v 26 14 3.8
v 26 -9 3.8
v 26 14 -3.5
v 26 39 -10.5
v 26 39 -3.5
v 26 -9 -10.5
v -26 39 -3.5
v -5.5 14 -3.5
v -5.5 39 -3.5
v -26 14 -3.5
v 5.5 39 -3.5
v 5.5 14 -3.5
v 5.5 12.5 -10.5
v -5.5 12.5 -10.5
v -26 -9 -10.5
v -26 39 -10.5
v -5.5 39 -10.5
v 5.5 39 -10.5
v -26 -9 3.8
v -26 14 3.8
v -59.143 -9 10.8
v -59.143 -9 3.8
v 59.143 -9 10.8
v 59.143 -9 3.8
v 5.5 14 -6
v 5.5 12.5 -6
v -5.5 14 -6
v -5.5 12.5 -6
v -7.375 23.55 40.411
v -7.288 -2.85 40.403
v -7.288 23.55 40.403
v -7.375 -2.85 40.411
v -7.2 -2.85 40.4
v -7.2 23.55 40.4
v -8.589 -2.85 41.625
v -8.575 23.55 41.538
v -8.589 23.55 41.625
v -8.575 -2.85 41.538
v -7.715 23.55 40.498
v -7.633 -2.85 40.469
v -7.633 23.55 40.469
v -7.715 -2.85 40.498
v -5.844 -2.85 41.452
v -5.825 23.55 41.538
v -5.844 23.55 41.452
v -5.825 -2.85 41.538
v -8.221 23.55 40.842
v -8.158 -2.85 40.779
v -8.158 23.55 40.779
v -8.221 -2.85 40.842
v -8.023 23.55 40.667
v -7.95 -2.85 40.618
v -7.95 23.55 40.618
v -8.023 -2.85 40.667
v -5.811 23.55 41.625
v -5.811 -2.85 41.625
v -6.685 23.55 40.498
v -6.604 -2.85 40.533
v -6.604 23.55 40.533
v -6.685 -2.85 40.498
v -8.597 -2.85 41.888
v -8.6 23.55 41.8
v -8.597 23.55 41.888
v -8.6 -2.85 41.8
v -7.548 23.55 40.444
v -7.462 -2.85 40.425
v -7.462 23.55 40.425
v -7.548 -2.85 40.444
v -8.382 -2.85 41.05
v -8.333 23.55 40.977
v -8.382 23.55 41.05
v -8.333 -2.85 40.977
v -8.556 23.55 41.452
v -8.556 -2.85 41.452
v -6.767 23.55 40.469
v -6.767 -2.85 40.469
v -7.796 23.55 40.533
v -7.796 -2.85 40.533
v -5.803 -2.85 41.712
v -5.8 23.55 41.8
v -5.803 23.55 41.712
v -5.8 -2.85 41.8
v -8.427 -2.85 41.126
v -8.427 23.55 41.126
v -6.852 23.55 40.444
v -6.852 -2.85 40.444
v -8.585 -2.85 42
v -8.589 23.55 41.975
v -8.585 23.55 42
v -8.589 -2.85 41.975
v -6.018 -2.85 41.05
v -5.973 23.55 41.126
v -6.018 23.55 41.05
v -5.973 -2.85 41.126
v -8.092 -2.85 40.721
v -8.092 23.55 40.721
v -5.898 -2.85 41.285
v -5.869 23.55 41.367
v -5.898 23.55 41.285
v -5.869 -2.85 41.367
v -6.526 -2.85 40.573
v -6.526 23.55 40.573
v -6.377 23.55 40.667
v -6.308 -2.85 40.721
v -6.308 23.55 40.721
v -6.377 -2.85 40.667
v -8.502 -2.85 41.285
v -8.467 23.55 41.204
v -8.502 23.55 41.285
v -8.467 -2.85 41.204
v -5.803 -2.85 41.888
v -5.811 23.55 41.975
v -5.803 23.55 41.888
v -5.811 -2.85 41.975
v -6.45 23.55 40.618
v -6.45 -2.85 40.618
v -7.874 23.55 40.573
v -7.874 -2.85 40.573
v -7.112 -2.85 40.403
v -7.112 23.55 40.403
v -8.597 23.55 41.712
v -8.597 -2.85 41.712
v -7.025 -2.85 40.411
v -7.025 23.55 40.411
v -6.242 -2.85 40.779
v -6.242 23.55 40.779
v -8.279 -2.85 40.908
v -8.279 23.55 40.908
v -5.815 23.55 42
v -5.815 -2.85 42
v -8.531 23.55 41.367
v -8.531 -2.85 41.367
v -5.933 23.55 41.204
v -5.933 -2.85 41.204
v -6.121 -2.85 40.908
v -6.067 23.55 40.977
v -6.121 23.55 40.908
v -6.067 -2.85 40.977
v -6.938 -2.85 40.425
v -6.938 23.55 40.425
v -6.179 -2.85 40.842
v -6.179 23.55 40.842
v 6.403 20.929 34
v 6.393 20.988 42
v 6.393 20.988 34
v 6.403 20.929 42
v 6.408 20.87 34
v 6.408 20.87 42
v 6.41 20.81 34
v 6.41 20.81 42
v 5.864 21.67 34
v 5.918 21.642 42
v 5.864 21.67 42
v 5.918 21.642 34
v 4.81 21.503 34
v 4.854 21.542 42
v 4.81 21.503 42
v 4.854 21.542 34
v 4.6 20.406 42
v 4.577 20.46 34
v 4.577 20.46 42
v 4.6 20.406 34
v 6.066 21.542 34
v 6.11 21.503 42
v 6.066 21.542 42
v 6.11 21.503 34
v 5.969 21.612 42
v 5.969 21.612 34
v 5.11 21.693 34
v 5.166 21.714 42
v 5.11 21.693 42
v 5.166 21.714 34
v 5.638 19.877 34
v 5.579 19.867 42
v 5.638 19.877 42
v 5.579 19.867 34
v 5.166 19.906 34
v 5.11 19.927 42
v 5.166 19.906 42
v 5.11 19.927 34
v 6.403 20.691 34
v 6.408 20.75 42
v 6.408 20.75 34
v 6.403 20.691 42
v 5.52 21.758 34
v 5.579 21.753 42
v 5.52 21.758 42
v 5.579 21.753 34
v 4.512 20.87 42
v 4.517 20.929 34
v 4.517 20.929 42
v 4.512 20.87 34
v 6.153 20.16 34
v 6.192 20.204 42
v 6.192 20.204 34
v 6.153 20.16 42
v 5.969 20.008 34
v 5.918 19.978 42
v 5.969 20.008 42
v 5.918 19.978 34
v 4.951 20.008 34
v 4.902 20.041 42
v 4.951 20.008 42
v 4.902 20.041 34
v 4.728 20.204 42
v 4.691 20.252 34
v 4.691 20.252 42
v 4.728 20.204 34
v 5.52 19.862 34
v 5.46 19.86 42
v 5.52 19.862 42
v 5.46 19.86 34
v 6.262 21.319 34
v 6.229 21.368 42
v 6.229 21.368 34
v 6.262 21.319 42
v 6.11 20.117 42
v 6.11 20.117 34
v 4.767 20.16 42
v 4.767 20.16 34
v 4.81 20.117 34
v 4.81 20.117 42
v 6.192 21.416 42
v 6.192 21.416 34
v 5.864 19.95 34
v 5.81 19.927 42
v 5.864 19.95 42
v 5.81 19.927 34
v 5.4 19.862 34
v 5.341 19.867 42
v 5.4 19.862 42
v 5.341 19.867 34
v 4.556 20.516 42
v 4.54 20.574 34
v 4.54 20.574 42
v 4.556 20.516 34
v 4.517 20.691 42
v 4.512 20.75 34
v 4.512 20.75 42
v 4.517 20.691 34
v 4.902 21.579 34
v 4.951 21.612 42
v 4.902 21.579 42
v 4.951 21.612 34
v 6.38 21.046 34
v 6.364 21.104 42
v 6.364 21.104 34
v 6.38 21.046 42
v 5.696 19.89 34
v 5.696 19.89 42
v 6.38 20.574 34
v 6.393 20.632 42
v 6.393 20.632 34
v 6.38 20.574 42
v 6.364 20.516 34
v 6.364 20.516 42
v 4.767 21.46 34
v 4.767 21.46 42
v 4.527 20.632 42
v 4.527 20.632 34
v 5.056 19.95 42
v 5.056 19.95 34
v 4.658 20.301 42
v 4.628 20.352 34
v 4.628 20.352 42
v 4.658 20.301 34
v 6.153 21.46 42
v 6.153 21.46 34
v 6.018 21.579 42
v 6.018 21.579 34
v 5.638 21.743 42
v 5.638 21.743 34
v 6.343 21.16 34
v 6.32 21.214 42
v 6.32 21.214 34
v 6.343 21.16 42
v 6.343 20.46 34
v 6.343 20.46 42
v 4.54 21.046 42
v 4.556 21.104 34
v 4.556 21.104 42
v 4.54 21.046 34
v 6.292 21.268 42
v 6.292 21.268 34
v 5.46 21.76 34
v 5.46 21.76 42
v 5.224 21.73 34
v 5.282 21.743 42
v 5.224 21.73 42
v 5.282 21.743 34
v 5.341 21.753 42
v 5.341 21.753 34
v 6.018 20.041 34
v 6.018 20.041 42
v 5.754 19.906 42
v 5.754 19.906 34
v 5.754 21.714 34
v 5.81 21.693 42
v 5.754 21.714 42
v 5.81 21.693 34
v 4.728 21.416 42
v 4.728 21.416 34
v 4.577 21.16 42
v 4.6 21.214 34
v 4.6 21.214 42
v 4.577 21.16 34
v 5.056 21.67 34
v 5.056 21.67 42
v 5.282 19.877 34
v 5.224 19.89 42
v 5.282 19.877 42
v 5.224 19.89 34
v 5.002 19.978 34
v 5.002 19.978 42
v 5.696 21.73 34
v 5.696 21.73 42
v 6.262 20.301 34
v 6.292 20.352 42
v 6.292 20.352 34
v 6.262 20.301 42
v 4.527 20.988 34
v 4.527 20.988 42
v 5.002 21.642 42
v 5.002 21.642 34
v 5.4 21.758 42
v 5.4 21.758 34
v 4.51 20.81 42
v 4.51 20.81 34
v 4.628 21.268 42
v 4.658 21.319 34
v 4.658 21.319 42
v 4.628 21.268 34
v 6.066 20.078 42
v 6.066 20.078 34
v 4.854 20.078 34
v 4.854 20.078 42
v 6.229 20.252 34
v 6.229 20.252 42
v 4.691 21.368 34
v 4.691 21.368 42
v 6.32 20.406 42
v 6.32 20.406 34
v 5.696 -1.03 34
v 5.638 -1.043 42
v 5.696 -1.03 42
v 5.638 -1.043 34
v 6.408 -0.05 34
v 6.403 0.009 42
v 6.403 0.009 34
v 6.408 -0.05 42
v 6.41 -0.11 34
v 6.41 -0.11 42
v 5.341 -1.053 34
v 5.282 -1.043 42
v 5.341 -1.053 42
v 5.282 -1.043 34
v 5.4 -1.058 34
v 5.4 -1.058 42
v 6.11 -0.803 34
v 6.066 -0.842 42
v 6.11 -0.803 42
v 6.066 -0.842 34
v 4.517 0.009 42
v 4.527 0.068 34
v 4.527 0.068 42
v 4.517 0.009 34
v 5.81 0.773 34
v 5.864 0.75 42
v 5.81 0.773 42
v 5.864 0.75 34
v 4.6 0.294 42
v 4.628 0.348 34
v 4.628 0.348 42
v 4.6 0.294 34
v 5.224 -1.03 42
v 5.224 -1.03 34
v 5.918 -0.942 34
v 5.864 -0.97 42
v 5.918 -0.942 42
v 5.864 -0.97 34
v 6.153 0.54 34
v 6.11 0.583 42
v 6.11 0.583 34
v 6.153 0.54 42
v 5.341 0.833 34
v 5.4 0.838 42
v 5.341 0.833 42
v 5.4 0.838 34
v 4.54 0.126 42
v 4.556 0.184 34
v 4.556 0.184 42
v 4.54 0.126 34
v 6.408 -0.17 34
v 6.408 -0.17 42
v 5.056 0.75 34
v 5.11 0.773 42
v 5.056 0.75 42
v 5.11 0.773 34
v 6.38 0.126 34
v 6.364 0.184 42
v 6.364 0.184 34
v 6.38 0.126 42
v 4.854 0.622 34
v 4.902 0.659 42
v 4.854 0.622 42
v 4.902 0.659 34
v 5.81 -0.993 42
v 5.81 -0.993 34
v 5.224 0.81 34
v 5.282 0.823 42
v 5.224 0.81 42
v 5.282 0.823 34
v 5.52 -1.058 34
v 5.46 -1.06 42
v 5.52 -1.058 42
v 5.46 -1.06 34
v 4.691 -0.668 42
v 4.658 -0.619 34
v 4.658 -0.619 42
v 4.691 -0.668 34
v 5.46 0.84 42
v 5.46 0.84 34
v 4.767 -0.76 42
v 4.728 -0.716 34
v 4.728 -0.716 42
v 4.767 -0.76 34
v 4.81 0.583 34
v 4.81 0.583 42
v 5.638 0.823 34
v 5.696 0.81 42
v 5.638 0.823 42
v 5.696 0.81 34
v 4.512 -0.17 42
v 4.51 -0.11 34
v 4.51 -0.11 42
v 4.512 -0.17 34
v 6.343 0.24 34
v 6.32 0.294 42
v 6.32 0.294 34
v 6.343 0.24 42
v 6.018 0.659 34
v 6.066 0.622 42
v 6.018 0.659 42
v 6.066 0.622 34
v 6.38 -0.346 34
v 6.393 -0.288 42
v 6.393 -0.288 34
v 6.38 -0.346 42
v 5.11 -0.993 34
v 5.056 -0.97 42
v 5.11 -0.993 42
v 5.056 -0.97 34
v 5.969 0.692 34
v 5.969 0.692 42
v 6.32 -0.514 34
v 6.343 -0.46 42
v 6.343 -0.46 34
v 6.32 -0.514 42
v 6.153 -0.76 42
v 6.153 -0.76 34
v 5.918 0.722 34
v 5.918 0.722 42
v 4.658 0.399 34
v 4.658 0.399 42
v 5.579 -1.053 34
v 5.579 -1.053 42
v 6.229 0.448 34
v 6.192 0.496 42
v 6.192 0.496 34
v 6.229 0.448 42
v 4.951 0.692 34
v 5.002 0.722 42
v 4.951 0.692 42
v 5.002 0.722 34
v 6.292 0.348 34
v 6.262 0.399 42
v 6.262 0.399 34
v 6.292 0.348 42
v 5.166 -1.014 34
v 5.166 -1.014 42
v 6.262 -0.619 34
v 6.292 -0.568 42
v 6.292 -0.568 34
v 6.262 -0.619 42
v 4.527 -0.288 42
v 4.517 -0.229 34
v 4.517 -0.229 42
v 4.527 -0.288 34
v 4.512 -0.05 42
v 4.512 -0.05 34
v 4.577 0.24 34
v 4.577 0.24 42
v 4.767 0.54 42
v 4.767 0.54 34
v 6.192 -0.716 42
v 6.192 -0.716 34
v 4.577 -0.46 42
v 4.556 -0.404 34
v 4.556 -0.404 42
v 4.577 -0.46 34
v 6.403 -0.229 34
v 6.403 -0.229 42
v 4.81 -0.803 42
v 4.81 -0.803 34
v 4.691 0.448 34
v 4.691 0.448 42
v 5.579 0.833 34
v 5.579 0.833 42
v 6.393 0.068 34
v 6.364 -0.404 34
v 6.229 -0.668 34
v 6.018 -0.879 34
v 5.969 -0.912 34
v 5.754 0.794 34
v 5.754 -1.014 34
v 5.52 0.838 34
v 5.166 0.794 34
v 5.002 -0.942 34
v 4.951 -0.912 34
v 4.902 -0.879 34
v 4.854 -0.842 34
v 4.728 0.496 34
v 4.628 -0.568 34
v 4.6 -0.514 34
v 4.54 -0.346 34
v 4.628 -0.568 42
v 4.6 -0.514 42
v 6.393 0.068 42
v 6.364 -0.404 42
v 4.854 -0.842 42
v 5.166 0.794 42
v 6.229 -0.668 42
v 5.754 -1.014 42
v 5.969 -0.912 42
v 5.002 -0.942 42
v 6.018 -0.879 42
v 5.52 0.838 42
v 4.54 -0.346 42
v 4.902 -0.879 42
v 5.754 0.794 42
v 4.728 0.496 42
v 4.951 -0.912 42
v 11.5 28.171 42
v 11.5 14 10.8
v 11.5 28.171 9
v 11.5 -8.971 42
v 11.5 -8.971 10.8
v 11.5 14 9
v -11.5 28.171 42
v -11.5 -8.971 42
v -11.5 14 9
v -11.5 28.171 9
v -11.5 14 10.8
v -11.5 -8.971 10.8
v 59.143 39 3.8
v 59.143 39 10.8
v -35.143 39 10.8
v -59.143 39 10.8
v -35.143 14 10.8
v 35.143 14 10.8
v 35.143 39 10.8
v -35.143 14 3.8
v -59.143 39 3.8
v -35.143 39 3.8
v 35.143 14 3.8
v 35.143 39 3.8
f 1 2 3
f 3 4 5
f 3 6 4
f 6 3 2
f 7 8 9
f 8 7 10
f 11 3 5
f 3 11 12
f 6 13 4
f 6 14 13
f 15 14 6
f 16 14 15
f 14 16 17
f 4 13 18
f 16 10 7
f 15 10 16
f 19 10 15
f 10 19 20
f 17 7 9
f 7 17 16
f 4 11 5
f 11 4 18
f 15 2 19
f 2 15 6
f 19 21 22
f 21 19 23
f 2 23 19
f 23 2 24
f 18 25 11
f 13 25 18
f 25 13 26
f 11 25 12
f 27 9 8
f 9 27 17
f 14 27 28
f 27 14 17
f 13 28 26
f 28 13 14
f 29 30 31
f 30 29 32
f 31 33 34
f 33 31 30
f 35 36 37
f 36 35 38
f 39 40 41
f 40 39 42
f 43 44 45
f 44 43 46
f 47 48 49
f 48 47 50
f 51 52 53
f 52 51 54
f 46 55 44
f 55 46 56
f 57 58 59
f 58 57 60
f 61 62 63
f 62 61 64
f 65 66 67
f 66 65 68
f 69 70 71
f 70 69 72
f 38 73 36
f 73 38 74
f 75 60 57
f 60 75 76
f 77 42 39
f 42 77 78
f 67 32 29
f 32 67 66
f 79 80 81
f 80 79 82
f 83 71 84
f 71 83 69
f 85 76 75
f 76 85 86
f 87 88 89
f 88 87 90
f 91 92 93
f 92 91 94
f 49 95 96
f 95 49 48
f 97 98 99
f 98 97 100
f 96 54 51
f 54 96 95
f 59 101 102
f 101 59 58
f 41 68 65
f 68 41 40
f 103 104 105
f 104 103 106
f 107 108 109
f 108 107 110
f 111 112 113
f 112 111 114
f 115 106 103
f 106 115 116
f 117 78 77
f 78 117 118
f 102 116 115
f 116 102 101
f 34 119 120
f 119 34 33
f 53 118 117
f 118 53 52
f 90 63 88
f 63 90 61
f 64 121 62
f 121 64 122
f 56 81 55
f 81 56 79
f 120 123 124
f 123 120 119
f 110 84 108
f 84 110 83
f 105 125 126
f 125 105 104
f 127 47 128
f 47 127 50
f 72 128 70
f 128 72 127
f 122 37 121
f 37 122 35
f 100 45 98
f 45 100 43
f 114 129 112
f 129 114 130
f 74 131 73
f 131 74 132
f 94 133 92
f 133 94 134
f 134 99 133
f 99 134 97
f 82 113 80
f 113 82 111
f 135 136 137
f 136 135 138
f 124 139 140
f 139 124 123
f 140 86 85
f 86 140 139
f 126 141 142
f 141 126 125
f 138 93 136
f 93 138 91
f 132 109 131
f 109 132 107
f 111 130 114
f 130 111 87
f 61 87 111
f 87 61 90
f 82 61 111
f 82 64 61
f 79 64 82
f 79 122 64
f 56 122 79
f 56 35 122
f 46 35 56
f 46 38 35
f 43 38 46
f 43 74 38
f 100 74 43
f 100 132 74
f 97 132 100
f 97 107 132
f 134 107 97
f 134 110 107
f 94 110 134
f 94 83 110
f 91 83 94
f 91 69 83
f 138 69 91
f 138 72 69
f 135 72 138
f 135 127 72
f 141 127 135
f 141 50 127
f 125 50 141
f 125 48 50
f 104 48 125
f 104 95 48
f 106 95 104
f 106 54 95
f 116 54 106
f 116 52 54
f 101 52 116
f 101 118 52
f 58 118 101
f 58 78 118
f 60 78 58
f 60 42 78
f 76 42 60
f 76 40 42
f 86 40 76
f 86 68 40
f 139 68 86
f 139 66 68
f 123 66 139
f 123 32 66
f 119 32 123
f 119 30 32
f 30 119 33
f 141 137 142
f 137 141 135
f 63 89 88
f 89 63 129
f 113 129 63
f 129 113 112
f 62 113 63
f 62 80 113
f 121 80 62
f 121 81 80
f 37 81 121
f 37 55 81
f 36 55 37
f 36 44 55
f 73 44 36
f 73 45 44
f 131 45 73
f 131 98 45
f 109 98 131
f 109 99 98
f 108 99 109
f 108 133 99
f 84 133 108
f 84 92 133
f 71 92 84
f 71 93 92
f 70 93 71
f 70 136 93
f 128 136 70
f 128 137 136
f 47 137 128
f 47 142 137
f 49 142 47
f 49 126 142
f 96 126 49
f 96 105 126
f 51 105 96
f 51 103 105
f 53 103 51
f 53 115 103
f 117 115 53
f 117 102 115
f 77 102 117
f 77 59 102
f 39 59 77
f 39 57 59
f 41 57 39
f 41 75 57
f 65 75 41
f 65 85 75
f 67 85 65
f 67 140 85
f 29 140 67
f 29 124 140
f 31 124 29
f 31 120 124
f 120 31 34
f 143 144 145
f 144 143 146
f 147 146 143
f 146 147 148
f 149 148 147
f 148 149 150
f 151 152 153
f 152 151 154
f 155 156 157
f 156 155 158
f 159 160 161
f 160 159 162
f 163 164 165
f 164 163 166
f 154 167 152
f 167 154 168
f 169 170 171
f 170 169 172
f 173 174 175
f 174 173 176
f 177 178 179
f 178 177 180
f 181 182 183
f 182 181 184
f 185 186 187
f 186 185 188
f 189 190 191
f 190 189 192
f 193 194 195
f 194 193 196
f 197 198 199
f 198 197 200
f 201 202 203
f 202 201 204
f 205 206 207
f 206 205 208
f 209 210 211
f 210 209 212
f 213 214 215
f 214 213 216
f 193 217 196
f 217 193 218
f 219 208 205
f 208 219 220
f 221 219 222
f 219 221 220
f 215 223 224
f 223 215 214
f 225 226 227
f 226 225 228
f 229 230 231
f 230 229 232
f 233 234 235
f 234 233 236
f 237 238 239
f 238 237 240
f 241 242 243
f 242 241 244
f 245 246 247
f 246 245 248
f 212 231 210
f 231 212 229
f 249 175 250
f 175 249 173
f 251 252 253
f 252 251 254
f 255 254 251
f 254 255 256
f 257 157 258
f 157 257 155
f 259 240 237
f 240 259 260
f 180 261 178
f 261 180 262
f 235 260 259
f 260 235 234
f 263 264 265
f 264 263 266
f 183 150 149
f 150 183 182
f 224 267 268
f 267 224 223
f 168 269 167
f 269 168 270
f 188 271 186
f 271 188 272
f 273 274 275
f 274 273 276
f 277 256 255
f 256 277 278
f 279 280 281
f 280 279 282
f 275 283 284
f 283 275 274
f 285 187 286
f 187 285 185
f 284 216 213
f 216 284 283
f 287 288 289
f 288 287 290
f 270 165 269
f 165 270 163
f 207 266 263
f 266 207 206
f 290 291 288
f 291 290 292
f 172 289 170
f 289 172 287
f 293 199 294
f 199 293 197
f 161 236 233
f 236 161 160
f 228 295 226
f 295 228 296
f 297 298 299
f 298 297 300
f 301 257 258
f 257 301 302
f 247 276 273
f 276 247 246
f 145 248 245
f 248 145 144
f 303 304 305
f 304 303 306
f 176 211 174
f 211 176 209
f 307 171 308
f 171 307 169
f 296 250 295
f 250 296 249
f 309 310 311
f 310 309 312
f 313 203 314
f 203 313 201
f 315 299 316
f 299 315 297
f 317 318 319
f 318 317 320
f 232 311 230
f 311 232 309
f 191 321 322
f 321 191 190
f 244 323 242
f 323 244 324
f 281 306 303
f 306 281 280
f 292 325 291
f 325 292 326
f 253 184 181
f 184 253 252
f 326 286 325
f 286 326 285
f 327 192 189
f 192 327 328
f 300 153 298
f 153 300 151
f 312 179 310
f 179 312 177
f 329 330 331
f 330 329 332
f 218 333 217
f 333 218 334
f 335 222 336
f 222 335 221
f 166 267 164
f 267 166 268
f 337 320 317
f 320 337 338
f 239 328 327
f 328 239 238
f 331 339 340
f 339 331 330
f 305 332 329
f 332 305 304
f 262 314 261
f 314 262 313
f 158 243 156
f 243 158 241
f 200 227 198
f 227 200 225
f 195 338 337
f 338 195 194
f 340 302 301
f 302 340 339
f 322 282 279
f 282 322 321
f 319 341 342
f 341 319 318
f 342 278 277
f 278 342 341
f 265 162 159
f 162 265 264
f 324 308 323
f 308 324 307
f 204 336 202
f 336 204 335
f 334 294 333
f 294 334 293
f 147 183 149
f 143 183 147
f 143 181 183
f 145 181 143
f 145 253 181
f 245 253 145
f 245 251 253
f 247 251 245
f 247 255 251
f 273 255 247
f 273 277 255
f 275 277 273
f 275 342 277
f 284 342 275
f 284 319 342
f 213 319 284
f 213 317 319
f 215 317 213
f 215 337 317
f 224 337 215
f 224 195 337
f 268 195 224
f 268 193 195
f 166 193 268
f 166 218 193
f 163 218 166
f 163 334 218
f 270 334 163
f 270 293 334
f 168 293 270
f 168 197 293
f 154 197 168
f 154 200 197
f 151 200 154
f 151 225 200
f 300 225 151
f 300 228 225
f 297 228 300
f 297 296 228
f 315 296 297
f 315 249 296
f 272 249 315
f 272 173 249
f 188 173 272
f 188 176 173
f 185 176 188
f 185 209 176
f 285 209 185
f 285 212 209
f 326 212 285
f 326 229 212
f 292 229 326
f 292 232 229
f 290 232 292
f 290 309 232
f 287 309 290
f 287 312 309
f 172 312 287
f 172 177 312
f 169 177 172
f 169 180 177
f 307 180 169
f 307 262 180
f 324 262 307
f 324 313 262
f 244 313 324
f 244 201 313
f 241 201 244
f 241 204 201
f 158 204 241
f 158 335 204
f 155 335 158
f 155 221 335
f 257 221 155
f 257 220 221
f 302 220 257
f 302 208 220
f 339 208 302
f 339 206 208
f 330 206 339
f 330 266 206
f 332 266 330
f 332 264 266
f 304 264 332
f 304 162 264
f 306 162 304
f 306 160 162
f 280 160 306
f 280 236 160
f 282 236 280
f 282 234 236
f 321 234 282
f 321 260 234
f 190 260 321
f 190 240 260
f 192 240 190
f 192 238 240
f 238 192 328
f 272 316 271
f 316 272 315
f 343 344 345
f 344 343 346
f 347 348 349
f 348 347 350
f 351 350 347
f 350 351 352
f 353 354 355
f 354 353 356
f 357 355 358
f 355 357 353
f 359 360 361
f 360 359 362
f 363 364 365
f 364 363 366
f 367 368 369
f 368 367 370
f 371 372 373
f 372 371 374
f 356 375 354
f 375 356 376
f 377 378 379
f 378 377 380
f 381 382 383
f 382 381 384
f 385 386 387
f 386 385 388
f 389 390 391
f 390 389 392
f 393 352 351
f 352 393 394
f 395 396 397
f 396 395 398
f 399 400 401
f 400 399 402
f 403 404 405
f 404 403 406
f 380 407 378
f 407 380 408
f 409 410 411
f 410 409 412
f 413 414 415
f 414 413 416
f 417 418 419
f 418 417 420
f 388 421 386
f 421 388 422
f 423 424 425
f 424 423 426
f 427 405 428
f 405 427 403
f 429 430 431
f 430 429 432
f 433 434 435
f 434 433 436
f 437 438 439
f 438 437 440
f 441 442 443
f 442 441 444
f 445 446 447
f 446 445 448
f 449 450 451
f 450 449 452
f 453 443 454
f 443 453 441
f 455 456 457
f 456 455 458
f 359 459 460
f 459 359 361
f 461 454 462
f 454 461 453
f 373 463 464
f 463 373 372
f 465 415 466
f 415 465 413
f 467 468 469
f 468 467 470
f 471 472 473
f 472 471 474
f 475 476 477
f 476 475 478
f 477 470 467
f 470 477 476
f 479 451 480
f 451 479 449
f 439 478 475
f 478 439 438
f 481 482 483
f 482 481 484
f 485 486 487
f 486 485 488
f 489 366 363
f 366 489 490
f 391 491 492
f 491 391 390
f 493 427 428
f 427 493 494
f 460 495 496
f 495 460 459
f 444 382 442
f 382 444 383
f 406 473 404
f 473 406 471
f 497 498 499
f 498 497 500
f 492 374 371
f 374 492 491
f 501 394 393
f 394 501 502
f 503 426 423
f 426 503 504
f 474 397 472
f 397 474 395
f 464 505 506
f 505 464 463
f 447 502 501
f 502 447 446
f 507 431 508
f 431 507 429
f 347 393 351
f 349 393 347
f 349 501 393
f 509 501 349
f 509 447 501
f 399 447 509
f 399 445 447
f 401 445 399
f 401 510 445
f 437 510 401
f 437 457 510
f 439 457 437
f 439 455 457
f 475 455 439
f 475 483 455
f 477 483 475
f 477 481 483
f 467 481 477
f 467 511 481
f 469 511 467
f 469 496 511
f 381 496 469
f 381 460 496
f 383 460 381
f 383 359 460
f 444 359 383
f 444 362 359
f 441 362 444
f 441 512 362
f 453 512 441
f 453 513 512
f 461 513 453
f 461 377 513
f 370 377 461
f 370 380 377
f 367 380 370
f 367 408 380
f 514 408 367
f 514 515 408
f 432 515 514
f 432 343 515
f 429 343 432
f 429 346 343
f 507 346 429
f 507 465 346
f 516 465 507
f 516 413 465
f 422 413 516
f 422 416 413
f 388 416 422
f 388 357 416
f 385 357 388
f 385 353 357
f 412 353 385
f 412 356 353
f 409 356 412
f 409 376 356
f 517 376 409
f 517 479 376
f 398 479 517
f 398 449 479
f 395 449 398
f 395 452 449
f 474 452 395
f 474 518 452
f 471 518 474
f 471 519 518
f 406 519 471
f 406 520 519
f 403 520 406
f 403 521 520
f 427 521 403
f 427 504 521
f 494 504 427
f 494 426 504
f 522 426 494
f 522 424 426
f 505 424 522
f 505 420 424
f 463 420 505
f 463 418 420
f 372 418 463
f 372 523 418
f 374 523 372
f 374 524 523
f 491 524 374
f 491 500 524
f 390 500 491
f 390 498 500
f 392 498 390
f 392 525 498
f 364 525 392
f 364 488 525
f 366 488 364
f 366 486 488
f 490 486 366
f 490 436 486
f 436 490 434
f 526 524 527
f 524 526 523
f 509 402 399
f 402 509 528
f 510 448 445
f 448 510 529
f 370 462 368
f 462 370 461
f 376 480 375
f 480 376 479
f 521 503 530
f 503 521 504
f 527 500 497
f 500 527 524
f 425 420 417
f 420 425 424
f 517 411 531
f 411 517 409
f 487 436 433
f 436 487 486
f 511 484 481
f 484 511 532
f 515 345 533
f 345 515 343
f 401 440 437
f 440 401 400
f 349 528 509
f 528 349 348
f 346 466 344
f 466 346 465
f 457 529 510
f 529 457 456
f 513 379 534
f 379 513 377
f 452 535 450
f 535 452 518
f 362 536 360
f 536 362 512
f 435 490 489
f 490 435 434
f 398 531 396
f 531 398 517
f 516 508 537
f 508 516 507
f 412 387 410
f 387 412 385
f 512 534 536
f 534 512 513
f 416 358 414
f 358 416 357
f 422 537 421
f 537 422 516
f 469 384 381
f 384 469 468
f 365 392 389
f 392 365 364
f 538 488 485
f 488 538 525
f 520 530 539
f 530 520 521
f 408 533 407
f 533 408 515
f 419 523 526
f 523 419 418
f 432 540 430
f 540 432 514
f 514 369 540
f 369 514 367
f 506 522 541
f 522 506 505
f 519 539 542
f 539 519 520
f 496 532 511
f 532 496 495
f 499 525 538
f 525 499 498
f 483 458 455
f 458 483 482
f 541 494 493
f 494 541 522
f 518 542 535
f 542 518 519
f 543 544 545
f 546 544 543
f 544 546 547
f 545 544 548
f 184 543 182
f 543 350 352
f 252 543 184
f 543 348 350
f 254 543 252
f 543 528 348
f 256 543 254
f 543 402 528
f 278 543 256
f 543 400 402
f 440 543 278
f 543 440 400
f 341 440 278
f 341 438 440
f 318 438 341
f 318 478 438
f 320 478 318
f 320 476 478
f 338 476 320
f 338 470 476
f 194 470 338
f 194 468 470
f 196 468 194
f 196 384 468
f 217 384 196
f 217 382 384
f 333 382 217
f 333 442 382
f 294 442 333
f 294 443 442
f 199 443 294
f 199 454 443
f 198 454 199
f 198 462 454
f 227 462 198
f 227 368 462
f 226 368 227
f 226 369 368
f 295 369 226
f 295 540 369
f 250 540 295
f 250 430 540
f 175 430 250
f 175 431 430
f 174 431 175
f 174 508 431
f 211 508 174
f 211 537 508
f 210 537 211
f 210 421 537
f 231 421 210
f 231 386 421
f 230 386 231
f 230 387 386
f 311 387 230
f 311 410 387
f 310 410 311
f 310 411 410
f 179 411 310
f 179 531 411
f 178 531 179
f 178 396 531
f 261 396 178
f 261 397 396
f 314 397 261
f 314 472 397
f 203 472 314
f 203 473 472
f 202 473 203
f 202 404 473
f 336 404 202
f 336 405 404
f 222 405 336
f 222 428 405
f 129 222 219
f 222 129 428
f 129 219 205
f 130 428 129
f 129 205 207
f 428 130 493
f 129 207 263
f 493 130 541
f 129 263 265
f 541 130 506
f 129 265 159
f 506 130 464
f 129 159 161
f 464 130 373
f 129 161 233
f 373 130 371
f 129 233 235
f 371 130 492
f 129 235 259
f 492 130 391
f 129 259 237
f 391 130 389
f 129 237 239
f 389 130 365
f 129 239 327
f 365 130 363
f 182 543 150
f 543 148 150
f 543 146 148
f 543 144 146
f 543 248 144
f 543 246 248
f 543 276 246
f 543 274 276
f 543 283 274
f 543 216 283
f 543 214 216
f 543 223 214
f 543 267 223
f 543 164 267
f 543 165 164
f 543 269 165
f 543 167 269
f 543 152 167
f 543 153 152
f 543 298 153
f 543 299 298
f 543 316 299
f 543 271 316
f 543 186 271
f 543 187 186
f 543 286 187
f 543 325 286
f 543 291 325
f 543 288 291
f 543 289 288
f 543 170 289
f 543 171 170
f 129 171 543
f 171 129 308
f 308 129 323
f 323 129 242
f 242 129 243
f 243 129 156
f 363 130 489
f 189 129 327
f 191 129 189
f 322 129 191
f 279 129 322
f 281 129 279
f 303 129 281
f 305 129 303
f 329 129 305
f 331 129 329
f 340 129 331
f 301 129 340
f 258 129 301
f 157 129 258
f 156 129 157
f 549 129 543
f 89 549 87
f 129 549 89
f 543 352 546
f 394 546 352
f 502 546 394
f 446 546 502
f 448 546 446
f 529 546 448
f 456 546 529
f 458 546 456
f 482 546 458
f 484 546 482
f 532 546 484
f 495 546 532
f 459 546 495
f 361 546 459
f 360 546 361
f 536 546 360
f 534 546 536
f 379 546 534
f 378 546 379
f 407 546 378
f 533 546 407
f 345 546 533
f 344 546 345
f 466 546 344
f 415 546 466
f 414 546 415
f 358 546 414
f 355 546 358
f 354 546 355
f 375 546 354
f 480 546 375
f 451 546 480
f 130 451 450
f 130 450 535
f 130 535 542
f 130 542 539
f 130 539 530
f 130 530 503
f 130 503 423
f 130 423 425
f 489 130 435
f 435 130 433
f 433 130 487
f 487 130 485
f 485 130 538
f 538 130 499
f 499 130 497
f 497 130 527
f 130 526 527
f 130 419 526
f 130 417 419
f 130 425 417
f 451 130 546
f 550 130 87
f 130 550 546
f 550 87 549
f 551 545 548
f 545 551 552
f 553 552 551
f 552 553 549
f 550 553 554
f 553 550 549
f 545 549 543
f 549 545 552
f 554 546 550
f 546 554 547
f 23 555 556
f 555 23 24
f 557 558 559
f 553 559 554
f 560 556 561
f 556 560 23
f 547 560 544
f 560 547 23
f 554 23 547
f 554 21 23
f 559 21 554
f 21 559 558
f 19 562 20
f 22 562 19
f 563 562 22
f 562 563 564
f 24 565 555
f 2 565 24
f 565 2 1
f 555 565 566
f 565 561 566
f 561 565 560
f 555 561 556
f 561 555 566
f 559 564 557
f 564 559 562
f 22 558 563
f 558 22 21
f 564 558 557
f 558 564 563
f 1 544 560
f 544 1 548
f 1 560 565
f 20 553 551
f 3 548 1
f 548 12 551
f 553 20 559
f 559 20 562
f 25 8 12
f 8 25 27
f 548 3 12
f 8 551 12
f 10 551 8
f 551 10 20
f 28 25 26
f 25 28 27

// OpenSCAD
// file: ../robot_settings.scad
main_box_x = 100; // 96
main_box_y = 102;
main_box_z = 74; // 74.5

lfp_main_box_x = 65;
lfp_main_box_y = 152;
lfp_main_box_z = 94;

wall_thickness = 5;

rail_gap = 2;
rail_inset = 7;

rail_thickness = 7;
rail_length = 250;
rail_width = 260;

lfp_battery_width = 65.5;
lfp_battery_depth = 150.5;
lfp_battery_height = 93;
lfp_battery_midterrace_width = 64.8;
lfp_battery_midterrace_depth = 150.2;
lfp_battery_midterrace_height = 7.8;
lfp_battery_topterrace_width = 62.8;
lfp_battery_topterrace_depth = 149.4;
lfp_battery_topterrace_height = 6.6;

// red right
// black left
lfp_battery_terminal_width = 9.2;
lfp_battery_terminal_depth = 9.5;
lfp_battery_terminal_depth_setback = 4.4;
lfp_battery_terminal_width_setback = 5.9;

raspberry_pi_screw_seperation_y = 57;
raspberry_pi_screw_seperation_z = 48;
raspberry_pi_peg_h = 5;

battery_box_peg_h = 6;
battery_box_peg_d = 9.5;
battery_box_peg_cutout = 5;

gears_module = 1;
pinion_gear_teeth = 32;
pinion_gear_width = 5;
pinion_gear_bore = 8;

gears_setback_distance = 25;
gear_post_height = 2 * pinion_gear_width + rail_thickness + 8 ;

steering_motor_mount_x = 45;
steering_motor_mount_y = 36;
steering_motor_mount_z = 18;
steering_motor_mount_setback_distance = gears_setback_distance + 16;

cradle_wall_thickness = 5;
post_thickness_x_y = 10;
post_wallside_position_y = 12.5;
post_separation_y = 47.5;
post_x_position = 70; // width of cradle. this is proportional to rail_width.

imu_width = 26; // x is along the width axis
imu_depth = 16; // y is along the depth axes. +y points at pins.
imu_screw_d = 3;
imu_screw_corner_border = 1.27;
imu_underside_pin_h = 1; // z is along the h axis
imu_thickness = 1.6;
imu_left_edge_pins = 1.6;

dc_motor_drivertype = "Teyleten"; // Teyleten
isAdafruit = (dc_motor_drivertype == "Adafruit");

drv8871_x = isAdafruit ? 20.3 : 21.6;
drv8871_y = isAdafruit ?  24 : 25;

drv8871_z = 2;
drv8871_screw_d = 2.5;
drv8871_solder_points_z = 2;

drv8871mount_edge_x = 1.5;
drv8871mount_edge_wall = 3;
drv8871mount_z = 5;
drv8871mount_x = drv8871_x +  drv8871mount_edge_wall - 2* drv8871mount_edge_x;
drv8871mount_y = 19;

drv8871_screw_distance = 15.64;
drv8871_solder_points_d = 1.66;
drv8871_solder_offset_y = 4.4;
drv8871_solder_inner_points_distance = 5;
drv8871_solder_outer_points_distance = 12;

dc_motor_75_1_encoder_z = 14.75;
dc_motor_75_1_encoder_d = 24.5;
dc_motor_75_1_housing_z = 30;
dc_motor_75_1_housing_d = 24.1;
dc_motor_75_1_gearbox_z = 23;
dc_motor_75_1_gearbox_d = 24.8;
dc_motor_75_1_z = dc_motor_75_1_encoder_z + dc_motor_75_1_housing_z + dc_motor_75_1_gearbox_z;

dc_motor_housing_minus_encoder_z = 48;
dc_motor_encoder_z = 9.33;
dc_motor_encoder_wheel_d = 13.4;
dc_motor_encoder_wheel_thickness = 5;
dc_motor_encoder_wheel_gap = 3;
dc_motor_encoder_circuit_thickness = 2;
dc_motor_z = dc_motor_housing_minus_encoder_z + dc_motor_encoder_z + dc_motor_encoder_wheel_thickness + dc_motor_encoder_wheel_gap + dc_motor_encoder_circuit_thickness;
dc_motor_cutout_d = 24.8;
dc_motor_cutout_z = 19.5;


M3_shaft_d = 2.82;

dc_motor_screw_head_z = 2;
dc_motor_screw_head_d = 5.6;
dc_motor_screw_d = 3.2;
dc_motor_screw_offset = 8.5;

dc_motor_axle_ring_z = 3;
dc_motor_axle_ring_d = 7.2;
dc_motor_axle_cutout_d = 4.2;
dc_motor_axle_cutout_z = 10;
dc_motor_axle_notch_cutout = 0.4;
dc_motor_axle_notch_cutout_z = 6;

pdmount_x = 20;
pdmount_y = 30;
pdmount_z = 2;
pdmount_edge_x = 1.5;
pdmount_edge_wall = 3;

steering_shaft_z = 45;
steering_shaft_d = 7;
steering_shaft_motor_fitting_d = 9;
coupler_length = 24.6;
coupler_diameter = 14;
coupler_screw_d = 4;
coupler_screw_z_offset = 8.3;
coupler_gear_side_insert = 12.6;
steering_shaft_with_coupler_z = steering_shaft_z - coupler_gear_side_insert;

lidar_mount_y = 110;
lidar_mount_x = 65 + 20;
lidar_narrow_screws = 40;
lidar_wide_screws = 56;
lidar_front_to_back_screws = 70;
lidar_screw_d = 3;
lidar_circuitboard_x = 20;
lidar_circuitboard_y = 35;
lidar_circuitboard_z = 1.2;
lidar_cord_length = 29;

ball_bearing_height = 7;
ball_bearing_outer_diameter = 22;
ball_bearing_inner_diameter = 8;

M4_diameter = 5.1;
M3_diameter = 2.9;
M3_length = 35;
M3_cap_length= 3;
M3_cap_diameter = 5.44;

suspension_spring_outer_diameter = 8;
suspension_spring_inner_diameter = 5.3;

armature_holder_height = 20;
armature_holder_thickness = 8;
pull_bar_peg_r = 3.2;
apparatus_locking_peg_d = 4;

rack_module = 1;
rack_length = main_box_x;
rack_height = 5;
rack_width = 10;
rack_teeth = 30;
rack_bore = 3;

pull_bar_length = rail_width / 2 - rack_length + 1;

// tire hardware
axle_length = 42.0; 
axle_reciever_inner_diameter = ball_bearing_inner_diameter;
axle_reciever_outer_diameter = 12;
axle_reciever_length = 18.8;
axle_notch_length = 15;
axle_notch_cutout = 2.4;

// power distribution bar
power_bar_cutout_x = 96;
power_bar_y = 19.1;
power_bar_z = 1.5;
power_bar_screw_distance = 91.4;
power_bar_screw_d = 2.8;
power_bar_standoff_z = 5;
power_bar_standoff_d = 6.83;

pico_expander_width = 63;
pico_expander_height = 57;
pico_screw_hole_offset = 3;
pico_screw_hole_d = 2.5;

usbhub_thickness = 11.7;
usbhub_depth = 37.5;
usbhub_width = 86.7;
usbhub_end_port_width = 14.8;
usbhub_end_port_height = 12;
usbhub_front_face_safe_zone_left = 15;
usbhub_front_face_safe_zone_right = 14.8;

switch_w = 16;
switch_cutout_d = 12.2;
switch_bump_h = 2;
switch_bump_l = 18.2;

i2c_mount_thickness = 3;
i2c_w = 28;
i2c_l = 28;
i2c_circuitboard_thickness = 1.23;
i2c_bottom_notch_w = 14.35;
i2c_bottom_notch_depth = 1;
i2c_screw_hole_d = 1.9;
i2c_screw_hole_offset = 1.4;
i2c_pin_l = 11;
i2c_pin_d = 0.8;
i2c_pin_offset = 1.5;
i2c_pin_separation = 2.5;
i2c_all_pins_l = 8.3;
i2c_screen_thickness = 1.88;
i2c_screen_w = 14.6;
i2c_screen_d = 27;
i2c_screen_offset = 4.1;
// main file
include <../robot_settings.scad>

$fn = 100;

module imu_platform(show_imu = false, show_platform = true)
{
       blade_length = 48;
       filling_length = 23;          
       tower_depth = blade_length / 2 - filling_length + 1.5;

       if (show_platform) {
          // right upper clam blade -71.43 = 200 / 2.8 -> -76.43 /  200 = 1/2.62
          translate([rail_width / 7 + post_thickness_x_y,  15, rail_thickness + .3])
          cube([blade_length / 2,  blade_length, rail_thickness], center = true);
        
          translate([-rail_width / 7 - post_thickness_x_y,  15, rail_thickness + .3])
          cube([blade_length / 2,  blade_length, rail_thickness], center = true);
        
          translate([0,  2.5, rail_thickness + .3])
          cube([rail_width / 3 + 17.5, 23, rail_thickness], center = true);
         
         // right filling
         translate([0, 2.5, -1])
         cube([rail_width / 5, filling_length, rail_thickness + 3], center = true);
           
           // right lower clam blade
         difference() {
            translate([0,  15, -rail_thickness])
            cube([rail_width / 5,  blade_length, rail_thickness], center = true);
            
            translate([0,  filling_length + 3, -rail_thickness])
            cube([post_thickness_x_y + 1, blade_length/ 2 + 3, 2 * rail_thickness], center = true);
          }
          
          translate([0, 7.1, 0]) {
             difference() {
                  // tower
                  translate([0, tower_depth, 15 + 1.5 * rail_thickness])
                  cube([ blade_length / 2 - 1, rail_width / 7, 40 - rail_thickness], center = true);
                    
                  // pins carveout
                  translate([0, tower_depth /  2 + imu_depth / 8, 42.8]) {
                    translate([-imu_depth / 2 + imu_underside_pin_h - .2, 0, -imu_underside_pin_h])
                      rotate([0,90,90]) 
                      color("yellow")
                      cylinder(h = imu_width + .4, r = imu_underside_pin_h + .4, center = true);
          
                      // screw hole
                      translate([ imu_depth / 2 - 2 * imu_screw_corner_border, imu_width / 2 - 2 * imu_screw_corner_border, -imu_thickness/2 - 3])
                      cylinder(10, d = i2c_screw_hole_d, center = true);
                      
                      // screw hole
                      translate([ imu_depth / 2 - 2 * imu_screw_corner_border,-imu_width / 2 + 2 * imu_screw_corner_border, -imu_thickness/2 - 3])
                      cylinder(10, d = i2c_screw_hole_d, center = true);
                   }
               }
            }
       }
       
       if (show_imu) {
            // imu holder
              translate([0, tower_depth /  2 + imu_depth / 8, 45]) {

                // pins
                translate([-imu_depth / 2 + imu_underside_pin_h - .2, 0, -imu_underside_pin_h])
                rotate([0,90,90]) 
                color("yellow")
                cylinder(h = imu_width - .2, r = imu_underside_pin_h, center = true);

                difference() {
                    color("green")      
                    cube([ imu_depth, imu_width, imu_thickness], center = true);
                   
                    // screw hole
                    translate([ imu_depth / 2 - 2 * imu_screw_corner_border, imu_width / 2 - 2 * imu_screw_corner_border, -imu_thickness/2])
                    cylinder(10, d = imu_screw_d, center = true);
                    
                    // screw hole
                    translate([ imu_depth / 2 - 2 * imu_screw_corner_border, -imu_width / 2 + 2 * imu_screw_corner_border, -imu_thickness/2])
                    cylinder(10, d = imu_screw_d, center = true);        
                }
            }
         }
}
imu_platform();
